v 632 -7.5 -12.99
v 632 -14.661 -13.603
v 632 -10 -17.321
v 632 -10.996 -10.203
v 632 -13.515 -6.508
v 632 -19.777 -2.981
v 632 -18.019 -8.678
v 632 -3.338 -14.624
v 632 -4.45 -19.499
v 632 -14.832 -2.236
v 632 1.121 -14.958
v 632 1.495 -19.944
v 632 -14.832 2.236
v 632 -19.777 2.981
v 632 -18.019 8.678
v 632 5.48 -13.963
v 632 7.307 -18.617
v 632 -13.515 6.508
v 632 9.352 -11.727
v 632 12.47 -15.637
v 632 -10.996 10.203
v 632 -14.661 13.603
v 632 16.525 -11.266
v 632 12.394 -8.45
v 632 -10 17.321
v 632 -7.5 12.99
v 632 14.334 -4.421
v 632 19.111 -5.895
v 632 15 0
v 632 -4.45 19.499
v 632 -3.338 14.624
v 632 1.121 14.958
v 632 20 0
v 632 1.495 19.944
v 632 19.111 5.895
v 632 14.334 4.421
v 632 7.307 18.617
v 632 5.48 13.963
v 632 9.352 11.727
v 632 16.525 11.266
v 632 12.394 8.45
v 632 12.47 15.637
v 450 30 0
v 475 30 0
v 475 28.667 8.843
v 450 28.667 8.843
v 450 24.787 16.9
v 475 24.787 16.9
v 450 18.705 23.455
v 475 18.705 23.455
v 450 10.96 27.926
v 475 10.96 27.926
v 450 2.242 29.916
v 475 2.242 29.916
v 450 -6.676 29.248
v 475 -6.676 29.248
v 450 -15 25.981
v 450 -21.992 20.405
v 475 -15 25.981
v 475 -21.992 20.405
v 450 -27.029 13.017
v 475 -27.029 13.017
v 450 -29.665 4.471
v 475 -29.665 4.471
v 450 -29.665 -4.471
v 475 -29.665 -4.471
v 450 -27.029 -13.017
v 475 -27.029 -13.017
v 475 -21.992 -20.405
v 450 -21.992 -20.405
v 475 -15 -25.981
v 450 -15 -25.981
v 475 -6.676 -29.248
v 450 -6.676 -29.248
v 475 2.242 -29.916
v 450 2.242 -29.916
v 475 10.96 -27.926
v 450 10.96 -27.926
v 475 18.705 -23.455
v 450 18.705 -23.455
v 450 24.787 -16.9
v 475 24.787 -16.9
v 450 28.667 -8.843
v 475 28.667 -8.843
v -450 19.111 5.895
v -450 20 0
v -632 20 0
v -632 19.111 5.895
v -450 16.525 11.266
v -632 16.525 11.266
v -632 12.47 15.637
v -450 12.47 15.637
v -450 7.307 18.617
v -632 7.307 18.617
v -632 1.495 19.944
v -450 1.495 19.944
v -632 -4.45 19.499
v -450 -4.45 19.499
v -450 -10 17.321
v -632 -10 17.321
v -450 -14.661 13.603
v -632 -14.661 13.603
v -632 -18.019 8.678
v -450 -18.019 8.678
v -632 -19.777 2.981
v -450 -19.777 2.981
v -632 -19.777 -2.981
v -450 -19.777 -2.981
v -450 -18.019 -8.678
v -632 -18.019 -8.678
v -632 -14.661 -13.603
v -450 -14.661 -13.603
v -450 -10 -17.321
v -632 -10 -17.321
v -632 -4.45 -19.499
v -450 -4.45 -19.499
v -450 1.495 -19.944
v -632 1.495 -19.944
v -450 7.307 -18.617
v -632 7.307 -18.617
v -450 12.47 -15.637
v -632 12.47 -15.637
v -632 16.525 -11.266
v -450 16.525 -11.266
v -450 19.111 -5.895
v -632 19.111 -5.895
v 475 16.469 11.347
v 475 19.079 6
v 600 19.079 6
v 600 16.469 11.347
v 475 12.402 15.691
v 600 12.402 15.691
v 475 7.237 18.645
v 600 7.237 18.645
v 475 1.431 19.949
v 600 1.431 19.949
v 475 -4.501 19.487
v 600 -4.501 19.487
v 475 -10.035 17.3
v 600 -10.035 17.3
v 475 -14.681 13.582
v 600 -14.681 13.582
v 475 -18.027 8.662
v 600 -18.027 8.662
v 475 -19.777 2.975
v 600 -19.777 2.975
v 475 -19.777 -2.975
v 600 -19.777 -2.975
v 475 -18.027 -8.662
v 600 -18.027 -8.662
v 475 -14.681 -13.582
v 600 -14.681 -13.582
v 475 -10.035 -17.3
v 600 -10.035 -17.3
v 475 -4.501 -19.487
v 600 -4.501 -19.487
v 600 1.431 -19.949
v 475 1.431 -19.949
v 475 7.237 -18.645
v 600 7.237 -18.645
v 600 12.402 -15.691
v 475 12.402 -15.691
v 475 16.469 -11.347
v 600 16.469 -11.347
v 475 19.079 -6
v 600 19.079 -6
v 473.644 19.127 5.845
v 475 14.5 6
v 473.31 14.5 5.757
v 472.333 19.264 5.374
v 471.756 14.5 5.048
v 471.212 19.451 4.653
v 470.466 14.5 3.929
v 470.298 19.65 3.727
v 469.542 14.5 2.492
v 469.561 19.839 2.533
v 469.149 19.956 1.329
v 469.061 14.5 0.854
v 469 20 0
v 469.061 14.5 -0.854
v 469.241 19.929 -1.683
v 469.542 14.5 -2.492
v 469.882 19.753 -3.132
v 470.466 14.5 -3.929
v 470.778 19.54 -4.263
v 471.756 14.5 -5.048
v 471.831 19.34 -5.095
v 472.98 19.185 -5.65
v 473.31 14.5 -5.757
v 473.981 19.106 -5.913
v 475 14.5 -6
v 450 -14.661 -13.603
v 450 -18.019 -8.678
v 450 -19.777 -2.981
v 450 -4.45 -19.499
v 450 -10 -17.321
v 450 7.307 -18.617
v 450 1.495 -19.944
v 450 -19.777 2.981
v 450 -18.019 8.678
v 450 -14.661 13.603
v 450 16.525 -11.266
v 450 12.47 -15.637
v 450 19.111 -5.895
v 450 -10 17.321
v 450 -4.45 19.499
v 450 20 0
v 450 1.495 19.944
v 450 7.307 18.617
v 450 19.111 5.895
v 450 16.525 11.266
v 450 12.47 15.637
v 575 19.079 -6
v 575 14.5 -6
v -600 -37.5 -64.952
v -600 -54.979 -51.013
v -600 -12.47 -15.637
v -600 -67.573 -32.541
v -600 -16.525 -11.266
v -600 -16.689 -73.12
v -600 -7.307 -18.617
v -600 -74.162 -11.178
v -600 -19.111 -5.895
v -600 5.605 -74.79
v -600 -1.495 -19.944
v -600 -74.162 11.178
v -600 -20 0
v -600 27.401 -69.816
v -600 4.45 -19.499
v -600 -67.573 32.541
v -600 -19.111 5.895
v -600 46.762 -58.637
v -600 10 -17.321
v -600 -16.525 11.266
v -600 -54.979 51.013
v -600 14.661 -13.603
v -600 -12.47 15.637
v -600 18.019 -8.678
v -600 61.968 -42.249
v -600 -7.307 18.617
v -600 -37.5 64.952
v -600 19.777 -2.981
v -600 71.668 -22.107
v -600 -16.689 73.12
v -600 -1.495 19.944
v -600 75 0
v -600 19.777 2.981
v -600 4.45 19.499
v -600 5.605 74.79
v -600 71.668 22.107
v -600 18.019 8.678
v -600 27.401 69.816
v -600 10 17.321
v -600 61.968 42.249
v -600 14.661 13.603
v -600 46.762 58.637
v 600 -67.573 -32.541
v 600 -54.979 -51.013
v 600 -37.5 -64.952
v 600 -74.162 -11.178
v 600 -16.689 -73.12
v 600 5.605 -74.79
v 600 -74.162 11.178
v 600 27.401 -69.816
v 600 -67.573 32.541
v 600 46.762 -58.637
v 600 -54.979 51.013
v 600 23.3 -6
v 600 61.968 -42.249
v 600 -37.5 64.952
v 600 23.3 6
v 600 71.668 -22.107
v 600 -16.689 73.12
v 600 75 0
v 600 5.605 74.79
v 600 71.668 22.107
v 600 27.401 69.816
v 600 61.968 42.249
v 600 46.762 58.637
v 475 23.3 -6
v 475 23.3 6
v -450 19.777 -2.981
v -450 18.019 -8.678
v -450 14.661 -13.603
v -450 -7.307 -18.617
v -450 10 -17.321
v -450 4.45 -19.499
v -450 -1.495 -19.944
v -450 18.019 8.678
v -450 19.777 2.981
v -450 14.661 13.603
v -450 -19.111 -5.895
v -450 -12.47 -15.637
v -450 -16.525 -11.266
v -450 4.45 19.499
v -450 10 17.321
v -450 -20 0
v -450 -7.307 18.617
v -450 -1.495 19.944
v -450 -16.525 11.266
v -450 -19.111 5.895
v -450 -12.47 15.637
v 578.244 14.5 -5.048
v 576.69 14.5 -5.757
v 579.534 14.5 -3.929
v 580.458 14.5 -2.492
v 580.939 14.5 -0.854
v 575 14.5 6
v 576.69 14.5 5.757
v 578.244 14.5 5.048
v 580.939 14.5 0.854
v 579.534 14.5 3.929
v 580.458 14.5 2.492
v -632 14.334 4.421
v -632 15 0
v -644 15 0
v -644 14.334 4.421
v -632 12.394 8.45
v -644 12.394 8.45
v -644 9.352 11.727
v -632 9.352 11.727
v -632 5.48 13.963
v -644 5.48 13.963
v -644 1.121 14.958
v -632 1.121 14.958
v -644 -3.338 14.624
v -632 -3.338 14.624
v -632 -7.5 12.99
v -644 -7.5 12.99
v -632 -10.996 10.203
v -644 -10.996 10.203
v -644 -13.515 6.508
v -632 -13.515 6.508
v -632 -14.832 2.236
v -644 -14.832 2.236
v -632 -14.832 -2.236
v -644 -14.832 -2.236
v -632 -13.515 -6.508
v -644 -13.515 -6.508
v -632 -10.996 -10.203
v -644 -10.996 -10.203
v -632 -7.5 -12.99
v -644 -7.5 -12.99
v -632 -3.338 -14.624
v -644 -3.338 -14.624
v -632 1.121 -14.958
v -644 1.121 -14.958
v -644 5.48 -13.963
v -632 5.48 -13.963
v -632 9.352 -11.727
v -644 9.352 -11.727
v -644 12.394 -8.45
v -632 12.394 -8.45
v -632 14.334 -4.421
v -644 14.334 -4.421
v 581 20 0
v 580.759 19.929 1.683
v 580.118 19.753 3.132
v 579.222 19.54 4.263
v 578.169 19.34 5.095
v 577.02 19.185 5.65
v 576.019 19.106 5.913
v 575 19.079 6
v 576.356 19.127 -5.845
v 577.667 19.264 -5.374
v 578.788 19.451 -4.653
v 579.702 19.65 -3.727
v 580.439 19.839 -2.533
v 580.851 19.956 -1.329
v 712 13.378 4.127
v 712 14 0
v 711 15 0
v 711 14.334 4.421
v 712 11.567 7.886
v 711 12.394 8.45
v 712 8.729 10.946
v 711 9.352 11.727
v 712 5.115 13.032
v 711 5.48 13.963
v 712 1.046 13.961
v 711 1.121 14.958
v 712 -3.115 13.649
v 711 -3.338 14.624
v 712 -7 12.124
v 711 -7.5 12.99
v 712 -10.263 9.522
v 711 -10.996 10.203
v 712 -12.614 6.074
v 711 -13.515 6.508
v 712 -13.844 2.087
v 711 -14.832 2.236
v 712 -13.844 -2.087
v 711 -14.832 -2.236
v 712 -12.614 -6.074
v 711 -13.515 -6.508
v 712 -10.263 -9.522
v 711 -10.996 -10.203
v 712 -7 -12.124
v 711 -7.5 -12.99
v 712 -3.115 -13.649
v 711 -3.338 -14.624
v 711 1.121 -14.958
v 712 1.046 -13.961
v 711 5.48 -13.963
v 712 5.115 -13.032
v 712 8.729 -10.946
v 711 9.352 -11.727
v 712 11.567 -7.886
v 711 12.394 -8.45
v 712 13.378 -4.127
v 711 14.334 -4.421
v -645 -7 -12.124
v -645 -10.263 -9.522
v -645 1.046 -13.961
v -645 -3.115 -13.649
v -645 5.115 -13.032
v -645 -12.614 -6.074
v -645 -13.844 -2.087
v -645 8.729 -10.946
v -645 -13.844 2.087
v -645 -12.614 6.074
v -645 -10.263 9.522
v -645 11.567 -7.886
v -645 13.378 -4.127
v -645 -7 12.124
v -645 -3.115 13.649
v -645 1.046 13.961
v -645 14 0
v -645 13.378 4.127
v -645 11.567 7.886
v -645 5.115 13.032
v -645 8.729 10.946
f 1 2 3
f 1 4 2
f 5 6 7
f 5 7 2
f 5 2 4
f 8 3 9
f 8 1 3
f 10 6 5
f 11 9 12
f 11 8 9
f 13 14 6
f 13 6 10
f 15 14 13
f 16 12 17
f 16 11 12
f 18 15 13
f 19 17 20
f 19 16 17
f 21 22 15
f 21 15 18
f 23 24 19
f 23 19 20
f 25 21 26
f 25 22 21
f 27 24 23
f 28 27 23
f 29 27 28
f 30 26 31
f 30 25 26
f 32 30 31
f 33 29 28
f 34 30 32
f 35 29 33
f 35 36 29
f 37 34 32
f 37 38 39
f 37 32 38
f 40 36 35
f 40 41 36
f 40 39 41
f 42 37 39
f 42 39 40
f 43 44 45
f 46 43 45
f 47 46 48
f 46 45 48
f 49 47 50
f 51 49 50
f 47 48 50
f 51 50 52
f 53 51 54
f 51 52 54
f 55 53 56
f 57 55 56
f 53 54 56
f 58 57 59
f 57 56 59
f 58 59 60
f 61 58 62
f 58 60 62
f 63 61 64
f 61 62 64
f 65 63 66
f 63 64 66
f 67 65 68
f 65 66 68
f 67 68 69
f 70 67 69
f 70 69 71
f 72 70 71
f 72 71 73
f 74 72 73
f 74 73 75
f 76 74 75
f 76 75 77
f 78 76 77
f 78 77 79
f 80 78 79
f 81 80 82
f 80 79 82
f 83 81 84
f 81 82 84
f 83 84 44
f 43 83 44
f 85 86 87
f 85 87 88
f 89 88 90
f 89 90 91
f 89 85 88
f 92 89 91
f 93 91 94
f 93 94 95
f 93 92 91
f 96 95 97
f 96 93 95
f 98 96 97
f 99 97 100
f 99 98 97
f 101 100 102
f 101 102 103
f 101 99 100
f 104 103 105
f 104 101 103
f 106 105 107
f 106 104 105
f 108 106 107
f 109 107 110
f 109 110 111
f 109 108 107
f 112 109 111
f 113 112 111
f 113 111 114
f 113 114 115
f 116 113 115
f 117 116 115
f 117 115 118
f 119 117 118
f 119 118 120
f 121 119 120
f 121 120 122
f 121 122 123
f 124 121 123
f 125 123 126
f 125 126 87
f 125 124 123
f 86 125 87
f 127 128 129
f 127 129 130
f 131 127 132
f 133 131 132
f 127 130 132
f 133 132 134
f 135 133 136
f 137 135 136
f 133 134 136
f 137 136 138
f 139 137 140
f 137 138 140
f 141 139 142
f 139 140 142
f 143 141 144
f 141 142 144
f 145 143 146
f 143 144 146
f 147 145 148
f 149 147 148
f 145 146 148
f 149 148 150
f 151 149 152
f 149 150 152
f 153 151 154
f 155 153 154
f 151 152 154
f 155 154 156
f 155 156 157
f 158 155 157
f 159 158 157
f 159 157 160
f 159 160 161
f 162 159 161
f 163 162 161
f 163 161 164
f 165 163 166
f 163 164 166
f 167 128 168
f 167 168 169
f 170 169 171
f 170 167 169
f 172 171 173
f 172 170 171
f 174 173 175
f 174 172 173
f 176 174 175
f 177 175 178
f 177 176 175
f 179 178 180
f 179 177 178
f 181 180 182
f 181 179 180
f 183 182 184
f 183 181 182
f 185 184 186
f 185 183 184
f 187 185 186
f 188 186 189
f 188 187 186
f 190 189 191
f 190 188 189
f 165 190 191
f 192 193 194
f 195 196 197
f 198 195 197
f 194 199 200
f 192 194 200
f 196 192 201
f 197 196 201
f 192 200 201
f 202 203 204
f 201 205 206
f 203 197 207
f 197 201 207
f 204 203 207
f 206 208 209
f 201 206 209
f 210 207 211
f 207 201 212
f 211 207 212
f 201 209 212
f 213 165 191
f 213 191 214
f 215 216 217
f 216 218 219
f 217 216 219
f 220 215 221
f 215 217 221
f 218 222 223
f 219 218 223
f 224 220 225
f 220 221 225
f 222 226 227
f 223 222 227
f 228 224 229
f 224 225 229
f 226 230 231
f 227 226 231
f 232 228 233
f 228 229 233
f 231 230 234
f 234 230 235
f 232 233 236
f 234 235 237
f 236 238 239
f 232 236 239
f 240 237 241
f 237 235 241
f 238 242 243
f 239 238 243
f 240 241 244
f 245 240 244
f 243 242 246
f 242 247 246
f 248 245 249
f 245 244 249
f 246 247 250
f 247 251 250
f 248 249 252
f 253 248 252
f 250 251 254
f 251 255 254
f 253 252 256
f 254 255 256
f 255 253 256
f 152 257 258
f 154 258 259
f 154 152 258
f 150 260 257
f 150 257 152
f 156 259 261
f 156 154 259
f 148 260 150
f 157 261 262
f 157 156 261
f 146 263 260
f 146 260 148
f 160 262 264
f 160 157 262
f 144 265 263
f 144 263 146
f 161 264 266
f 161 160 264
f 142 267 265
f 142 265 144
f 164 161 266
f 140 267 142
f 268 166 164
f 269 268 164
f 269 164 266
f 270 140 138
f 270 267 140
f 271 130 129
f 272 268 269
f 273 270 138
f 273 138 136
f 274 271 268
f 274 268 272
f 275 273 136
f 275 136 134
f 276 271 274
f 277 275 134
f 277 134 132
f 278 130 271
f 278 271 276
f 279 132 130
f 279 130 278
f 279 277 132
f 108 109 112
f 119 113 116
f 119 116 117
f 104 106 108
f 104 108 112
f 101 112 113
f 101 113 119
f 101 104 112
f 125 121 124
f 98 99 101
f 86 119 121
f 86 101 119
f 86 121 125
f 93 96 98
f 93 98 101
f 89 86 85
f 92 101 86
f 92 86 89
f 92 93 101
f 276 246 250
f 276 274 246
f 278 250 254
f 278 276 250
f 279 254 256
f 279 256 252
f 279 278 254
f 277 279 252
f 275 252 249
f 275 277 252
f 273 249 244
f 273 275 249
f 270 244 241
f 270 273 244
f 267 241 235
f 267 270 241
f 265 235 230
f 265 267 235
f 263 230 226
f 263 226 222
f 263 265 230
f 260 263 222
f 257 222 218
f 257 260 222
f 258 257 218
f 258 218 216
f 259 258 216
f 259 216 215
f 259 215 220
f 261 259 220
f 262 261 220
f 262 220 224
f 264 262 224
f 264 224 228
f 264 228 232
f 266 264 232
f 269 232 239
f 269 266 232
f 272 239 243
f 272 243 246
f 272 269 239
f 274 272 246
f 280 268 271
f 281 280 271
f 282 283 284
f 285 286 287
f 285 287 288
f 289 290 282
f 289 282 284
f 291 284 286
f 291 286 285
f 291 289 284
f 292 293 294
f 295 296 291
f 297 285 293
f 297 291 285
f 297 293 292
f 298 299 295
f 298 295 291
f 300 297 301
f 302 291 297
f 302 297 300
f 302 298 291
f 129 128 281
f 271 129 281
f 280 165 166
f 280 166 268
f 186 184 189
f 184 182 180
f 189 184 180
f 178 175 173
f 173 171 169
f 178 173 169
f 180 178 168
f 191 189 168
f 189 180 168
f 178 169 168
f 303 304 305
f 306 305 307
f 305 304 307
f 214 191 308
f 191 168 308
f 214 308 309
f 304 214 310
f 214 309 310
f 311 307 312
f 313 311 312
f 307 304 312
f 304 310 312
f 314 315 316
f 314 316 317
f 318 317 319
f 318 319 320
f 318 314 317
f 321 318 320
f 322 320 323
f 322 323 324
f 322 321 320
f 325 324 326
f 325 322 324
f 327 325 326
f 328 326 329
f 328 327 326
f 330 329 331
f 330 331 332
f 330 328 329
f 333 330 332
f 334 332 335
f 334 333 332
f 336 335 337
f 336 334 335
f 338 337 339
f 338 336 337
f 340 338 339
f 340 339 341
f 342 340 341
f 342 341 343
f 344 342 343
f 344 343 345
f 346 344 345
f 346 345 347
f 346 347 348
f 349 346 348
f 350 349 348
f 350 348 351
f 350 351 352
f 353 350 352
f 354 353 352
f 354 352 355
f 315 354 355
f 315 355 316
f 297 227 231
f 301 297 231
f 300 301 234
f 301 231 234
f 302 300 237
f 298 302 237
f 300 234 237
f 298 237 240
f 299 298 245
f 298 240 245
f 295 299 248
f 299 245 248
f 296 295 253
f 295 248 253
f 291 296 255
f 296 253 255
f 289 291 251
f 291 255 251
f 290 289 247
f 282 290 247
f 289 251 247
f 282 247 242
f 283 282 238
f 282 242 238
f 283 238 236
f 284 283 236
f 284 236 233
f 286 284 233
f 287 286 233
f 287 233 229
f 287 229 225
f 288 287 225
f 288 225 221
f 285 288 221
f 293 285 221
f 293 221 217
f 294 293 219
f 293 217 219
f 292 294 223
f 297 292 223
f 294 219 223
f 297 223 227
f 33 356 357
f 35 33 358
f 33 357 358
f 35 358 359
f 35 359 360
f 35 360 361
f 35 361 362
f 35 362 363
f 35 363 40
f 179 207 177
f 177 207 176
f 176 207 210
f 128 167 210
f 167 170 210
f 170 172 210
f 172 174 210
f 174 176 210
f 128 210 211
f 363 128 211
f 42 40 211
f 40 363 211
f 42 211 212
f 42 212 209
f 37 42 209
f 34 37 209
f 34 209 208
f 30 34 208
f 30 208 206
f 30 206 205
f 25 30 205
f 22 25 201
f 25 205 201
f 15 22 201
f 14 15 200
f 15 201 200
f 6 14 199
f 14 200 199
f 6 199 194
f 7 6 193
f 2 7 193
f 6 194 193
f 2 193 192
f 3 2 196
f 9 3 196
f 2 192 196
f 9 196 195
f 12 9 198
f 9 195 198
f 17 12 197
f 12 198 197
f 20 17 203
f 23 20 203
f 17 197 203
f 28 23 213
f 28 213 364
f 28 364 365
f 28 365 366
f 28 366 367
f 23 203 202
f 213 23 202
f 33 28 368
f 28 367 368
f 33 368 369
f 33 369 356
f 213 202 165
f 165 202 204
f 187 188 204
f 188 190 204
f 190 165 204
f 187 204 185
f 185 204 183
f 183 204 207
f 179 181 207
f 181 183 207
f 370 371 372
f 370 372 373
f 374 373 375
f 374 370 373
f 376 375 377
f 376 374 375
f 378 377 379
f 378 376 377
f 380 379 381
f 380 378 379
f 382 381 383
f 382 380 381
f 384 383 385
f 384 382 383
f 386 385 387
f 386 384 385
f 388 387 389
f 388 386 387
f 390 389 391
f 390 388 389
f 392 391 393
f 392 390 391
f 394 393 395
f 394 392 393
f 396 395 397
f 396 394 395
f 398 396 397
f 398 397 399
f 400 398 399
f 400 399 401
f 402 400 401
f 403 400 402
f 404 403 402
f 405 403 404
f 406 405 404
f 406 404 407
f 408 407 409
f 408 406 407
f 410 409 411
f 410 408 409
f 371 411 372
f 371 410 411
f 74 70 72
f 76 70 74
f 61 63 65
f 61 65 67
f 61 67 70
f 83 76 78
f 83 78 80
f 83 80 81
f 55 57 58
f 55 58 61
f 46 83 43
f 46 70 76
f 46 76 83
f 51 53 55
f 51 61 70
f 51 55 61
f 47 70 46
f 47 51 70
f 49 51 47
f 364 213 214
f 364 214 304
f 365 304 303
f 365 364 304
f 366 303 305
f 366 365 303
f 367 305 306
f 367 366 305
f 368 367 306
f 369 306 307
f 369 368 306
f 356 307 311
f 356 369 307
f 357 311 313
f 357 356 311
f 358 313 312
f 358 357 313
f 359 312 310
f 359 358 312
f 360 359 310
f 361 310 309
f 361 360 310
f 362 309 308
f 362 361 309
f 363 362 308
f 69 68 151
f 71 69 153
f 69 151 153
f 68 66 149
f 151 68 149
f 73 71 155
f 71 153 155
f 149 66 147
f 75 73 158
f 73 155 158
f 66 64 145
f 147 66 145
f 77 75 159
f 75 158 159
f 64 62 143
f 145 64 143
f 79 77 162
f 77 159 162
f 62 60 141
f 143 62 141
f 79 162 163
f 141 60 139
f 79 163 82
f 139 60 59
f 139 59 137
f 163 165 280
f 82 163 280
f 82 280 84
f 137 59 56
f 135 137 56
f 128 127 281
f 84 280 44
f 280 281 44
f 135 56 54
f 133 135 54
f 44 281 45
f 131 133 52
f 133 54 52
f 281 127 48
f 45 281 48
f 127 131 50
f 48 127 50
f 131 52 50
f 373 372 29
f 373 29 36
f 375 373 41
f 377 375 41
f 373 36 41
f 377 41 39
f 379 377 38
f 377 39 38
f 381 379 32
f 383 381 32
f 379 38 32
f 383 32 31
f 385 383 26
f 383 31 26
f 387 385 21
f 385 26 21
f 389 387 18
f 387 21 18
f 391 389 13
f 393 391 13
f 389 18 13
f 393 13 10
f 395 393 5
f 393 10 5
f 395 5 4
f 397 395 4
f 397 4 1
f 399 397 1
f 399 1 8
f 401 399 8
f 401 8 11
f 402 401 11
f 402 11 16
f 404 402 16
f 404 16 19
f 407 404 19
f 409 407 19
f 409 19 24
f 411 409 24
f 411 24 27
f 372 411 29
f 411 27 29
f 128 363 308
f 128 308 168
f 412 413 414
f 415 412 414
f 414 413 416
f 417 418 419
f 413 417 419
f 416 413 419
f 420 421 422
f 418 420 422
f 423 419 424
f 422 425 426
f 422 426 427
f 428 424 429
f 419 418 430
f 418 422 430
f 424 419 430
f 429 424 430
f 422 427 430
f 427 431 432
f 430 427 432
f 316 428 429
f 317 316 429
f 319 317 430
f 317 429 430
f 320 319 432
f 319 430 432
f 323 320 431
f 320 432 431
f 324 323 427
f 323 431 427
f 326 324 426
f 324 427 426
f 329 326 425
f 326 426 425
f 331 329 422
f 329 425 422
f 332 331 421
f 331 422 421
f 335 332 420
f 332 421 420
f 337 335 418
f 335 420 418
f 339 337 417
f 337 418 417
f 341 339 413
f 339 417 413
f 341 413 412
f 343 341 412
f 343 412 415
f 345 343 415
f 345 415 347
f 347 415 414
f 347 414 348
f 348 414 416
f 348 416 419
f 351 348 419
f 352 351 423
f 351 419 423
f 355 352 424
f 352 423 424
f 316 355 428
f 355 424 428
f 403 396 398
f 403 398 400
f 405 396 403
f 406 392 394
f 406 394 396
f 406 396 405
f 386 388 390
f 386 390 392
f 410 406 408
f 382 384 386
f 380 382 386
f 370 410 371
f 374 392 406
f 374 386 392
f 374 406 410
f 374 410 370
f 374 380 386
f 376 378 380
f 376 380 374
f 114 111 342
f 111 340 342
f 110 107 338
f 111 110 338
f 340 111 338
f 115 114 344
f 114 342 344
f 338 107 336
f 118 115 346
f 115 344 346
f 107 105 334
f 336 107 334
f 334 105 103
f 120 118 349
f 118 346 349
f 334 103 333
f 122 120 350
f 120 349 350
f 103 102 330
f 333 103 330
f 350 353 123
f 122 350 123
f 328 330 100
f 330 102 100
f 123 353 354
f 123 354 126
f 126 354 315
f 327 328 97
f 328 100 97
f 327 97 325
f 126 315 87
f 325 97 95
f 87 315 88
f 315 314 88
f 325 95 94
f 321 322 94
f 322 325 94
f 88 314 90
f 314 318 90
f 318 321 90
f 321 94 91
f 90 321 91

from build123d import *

# Parameters (mm, degrees)
F0_R       = 75
F1_DEPTH   = 600
F2_R       = 20
F3_DEPTH   = 150
F4_R       = 20
F5_DEPTH   = 150
F6_W       = 4.2212159717
F6_H       = 12
F7_DEPTH   = 125
F8_R       = 20
F9_DEPTH   = 182
F10_R      = 15
F11_DEPTH  = 80
F14_DEPTH  = 8.8
F16_R      = 30
F17_DEPTH  = 25
F18_DEPTH  = 67
F19_SIZE   = 1
F19_2_SIZE = 1


with BuildPart() as f1:
    # F0 (on Right) → F1 (new body, symmetric)
    with BuildSketch(Plane.YZ):
        Circle(F0_R)
    extrude(amount=F1_DEPTH, both=True)

    # F2 (on face) → F3 (cut)
    with BuildSketch(Plane.YZ.offset(600)):
        Circle(F2_R)
    extrude(amount=-F3_DEPTH, mode=Mode.SUBTRACT)

    # F4 (on face) → F5 (cut)
    with BuildSketch(Plane(origin=(-600, 0, 0), x_dir=(0, -1, 0), z_dir=(-1, 0, 0))):
        Circle(F4_R)
    extrude(amount=-F5_DEPTH, mode=Mode.SUBTRACT)

    # F6 (on face) → F7 (cut)
    with BuildSketch(Plane.YZ.offset(600)):
        with Locations((21.1893920142, 0)):
            Rectangle(F6_W, F6_H)
    extrude(amount=-F7_DEPTH, mode=Mode.SUBTRACT)


with BuildPart() as f9:
    # F8 (on face) → F9 (new body)
    with BuildSketch(Plane.YZ.offset(450)):
        Circle(F8_R)
    extrude(amount=F9_DEPTH)

    # F10 (on face) → F11 (join)
    with BuildSketch(Plane.YZ.offset(632)):
        Circle(F10_R)
    extrude(amount=F11_DEPTH)


with BuildPart() as f12_1:
    # F12: instance of F9
    add(f9.part.mirror(Plane.YZ))

    # F18 (cut): a face of the model
    f18_faces = [f12_1.faces().sort_by_distance(p)[0] for p in [
        (-712, 0, 0),
    ]]
    extrude(f18_faces, amount=-F18_DEPTH, mode=Mode.SUBTRACT)

    # F19
    f19_edges = [f12_1.edges().sort_by_distance(p)[0] for p in [
        (-645, -15, 0),
    ]]
    chamfer(f19_edges, length=F19_SIZE)


with BuildPart() as f14_tool:
    # F13 (on face) → F14 (new body)
    with BuildSketch(Plane.XZ.offset(-23.3)):
        with BuildLine():
            ThreePointArc((475, 6), (469, 0), (475, -6))
            Line((475, -6), (575, -6))
            ThreePointArc((575, -6), (581, 0), (575, 6))
            Line((575, 6), (475, 6))
        make_face()
    extrude(amount=F14_DEPTH)


with BuildPart() as f1_1:
    add(f1.part)

    # F14: cut by f14_tool
    add(f14_tool.part, mode=Mode.SUBTRACT)

    # F16 (on offset) → F17 (cut)
    with BuildSketch(Plane.YZ.offset(475)):
        Circle(F16_R)
    extrude(amount=-F17_DEPTH, mode=Mode.SUBTRACT)


with BuildPart() as f9_1:
    add(f9.part)

    # F14: cut by f14_tool
    add(f14_tool.part, mode=Mode.SUBTRACT)

    # F19#2
    f19_2_edges = [f9_1.edges().sort_by_distance(p)[0] for p in [
        (712, -15, 0),
    ]]
    chamfer(f19_2_edges, length=F19_2_SIZE)


solid = Compound([f12_1.part, f1_1.part, f9_1.part])
